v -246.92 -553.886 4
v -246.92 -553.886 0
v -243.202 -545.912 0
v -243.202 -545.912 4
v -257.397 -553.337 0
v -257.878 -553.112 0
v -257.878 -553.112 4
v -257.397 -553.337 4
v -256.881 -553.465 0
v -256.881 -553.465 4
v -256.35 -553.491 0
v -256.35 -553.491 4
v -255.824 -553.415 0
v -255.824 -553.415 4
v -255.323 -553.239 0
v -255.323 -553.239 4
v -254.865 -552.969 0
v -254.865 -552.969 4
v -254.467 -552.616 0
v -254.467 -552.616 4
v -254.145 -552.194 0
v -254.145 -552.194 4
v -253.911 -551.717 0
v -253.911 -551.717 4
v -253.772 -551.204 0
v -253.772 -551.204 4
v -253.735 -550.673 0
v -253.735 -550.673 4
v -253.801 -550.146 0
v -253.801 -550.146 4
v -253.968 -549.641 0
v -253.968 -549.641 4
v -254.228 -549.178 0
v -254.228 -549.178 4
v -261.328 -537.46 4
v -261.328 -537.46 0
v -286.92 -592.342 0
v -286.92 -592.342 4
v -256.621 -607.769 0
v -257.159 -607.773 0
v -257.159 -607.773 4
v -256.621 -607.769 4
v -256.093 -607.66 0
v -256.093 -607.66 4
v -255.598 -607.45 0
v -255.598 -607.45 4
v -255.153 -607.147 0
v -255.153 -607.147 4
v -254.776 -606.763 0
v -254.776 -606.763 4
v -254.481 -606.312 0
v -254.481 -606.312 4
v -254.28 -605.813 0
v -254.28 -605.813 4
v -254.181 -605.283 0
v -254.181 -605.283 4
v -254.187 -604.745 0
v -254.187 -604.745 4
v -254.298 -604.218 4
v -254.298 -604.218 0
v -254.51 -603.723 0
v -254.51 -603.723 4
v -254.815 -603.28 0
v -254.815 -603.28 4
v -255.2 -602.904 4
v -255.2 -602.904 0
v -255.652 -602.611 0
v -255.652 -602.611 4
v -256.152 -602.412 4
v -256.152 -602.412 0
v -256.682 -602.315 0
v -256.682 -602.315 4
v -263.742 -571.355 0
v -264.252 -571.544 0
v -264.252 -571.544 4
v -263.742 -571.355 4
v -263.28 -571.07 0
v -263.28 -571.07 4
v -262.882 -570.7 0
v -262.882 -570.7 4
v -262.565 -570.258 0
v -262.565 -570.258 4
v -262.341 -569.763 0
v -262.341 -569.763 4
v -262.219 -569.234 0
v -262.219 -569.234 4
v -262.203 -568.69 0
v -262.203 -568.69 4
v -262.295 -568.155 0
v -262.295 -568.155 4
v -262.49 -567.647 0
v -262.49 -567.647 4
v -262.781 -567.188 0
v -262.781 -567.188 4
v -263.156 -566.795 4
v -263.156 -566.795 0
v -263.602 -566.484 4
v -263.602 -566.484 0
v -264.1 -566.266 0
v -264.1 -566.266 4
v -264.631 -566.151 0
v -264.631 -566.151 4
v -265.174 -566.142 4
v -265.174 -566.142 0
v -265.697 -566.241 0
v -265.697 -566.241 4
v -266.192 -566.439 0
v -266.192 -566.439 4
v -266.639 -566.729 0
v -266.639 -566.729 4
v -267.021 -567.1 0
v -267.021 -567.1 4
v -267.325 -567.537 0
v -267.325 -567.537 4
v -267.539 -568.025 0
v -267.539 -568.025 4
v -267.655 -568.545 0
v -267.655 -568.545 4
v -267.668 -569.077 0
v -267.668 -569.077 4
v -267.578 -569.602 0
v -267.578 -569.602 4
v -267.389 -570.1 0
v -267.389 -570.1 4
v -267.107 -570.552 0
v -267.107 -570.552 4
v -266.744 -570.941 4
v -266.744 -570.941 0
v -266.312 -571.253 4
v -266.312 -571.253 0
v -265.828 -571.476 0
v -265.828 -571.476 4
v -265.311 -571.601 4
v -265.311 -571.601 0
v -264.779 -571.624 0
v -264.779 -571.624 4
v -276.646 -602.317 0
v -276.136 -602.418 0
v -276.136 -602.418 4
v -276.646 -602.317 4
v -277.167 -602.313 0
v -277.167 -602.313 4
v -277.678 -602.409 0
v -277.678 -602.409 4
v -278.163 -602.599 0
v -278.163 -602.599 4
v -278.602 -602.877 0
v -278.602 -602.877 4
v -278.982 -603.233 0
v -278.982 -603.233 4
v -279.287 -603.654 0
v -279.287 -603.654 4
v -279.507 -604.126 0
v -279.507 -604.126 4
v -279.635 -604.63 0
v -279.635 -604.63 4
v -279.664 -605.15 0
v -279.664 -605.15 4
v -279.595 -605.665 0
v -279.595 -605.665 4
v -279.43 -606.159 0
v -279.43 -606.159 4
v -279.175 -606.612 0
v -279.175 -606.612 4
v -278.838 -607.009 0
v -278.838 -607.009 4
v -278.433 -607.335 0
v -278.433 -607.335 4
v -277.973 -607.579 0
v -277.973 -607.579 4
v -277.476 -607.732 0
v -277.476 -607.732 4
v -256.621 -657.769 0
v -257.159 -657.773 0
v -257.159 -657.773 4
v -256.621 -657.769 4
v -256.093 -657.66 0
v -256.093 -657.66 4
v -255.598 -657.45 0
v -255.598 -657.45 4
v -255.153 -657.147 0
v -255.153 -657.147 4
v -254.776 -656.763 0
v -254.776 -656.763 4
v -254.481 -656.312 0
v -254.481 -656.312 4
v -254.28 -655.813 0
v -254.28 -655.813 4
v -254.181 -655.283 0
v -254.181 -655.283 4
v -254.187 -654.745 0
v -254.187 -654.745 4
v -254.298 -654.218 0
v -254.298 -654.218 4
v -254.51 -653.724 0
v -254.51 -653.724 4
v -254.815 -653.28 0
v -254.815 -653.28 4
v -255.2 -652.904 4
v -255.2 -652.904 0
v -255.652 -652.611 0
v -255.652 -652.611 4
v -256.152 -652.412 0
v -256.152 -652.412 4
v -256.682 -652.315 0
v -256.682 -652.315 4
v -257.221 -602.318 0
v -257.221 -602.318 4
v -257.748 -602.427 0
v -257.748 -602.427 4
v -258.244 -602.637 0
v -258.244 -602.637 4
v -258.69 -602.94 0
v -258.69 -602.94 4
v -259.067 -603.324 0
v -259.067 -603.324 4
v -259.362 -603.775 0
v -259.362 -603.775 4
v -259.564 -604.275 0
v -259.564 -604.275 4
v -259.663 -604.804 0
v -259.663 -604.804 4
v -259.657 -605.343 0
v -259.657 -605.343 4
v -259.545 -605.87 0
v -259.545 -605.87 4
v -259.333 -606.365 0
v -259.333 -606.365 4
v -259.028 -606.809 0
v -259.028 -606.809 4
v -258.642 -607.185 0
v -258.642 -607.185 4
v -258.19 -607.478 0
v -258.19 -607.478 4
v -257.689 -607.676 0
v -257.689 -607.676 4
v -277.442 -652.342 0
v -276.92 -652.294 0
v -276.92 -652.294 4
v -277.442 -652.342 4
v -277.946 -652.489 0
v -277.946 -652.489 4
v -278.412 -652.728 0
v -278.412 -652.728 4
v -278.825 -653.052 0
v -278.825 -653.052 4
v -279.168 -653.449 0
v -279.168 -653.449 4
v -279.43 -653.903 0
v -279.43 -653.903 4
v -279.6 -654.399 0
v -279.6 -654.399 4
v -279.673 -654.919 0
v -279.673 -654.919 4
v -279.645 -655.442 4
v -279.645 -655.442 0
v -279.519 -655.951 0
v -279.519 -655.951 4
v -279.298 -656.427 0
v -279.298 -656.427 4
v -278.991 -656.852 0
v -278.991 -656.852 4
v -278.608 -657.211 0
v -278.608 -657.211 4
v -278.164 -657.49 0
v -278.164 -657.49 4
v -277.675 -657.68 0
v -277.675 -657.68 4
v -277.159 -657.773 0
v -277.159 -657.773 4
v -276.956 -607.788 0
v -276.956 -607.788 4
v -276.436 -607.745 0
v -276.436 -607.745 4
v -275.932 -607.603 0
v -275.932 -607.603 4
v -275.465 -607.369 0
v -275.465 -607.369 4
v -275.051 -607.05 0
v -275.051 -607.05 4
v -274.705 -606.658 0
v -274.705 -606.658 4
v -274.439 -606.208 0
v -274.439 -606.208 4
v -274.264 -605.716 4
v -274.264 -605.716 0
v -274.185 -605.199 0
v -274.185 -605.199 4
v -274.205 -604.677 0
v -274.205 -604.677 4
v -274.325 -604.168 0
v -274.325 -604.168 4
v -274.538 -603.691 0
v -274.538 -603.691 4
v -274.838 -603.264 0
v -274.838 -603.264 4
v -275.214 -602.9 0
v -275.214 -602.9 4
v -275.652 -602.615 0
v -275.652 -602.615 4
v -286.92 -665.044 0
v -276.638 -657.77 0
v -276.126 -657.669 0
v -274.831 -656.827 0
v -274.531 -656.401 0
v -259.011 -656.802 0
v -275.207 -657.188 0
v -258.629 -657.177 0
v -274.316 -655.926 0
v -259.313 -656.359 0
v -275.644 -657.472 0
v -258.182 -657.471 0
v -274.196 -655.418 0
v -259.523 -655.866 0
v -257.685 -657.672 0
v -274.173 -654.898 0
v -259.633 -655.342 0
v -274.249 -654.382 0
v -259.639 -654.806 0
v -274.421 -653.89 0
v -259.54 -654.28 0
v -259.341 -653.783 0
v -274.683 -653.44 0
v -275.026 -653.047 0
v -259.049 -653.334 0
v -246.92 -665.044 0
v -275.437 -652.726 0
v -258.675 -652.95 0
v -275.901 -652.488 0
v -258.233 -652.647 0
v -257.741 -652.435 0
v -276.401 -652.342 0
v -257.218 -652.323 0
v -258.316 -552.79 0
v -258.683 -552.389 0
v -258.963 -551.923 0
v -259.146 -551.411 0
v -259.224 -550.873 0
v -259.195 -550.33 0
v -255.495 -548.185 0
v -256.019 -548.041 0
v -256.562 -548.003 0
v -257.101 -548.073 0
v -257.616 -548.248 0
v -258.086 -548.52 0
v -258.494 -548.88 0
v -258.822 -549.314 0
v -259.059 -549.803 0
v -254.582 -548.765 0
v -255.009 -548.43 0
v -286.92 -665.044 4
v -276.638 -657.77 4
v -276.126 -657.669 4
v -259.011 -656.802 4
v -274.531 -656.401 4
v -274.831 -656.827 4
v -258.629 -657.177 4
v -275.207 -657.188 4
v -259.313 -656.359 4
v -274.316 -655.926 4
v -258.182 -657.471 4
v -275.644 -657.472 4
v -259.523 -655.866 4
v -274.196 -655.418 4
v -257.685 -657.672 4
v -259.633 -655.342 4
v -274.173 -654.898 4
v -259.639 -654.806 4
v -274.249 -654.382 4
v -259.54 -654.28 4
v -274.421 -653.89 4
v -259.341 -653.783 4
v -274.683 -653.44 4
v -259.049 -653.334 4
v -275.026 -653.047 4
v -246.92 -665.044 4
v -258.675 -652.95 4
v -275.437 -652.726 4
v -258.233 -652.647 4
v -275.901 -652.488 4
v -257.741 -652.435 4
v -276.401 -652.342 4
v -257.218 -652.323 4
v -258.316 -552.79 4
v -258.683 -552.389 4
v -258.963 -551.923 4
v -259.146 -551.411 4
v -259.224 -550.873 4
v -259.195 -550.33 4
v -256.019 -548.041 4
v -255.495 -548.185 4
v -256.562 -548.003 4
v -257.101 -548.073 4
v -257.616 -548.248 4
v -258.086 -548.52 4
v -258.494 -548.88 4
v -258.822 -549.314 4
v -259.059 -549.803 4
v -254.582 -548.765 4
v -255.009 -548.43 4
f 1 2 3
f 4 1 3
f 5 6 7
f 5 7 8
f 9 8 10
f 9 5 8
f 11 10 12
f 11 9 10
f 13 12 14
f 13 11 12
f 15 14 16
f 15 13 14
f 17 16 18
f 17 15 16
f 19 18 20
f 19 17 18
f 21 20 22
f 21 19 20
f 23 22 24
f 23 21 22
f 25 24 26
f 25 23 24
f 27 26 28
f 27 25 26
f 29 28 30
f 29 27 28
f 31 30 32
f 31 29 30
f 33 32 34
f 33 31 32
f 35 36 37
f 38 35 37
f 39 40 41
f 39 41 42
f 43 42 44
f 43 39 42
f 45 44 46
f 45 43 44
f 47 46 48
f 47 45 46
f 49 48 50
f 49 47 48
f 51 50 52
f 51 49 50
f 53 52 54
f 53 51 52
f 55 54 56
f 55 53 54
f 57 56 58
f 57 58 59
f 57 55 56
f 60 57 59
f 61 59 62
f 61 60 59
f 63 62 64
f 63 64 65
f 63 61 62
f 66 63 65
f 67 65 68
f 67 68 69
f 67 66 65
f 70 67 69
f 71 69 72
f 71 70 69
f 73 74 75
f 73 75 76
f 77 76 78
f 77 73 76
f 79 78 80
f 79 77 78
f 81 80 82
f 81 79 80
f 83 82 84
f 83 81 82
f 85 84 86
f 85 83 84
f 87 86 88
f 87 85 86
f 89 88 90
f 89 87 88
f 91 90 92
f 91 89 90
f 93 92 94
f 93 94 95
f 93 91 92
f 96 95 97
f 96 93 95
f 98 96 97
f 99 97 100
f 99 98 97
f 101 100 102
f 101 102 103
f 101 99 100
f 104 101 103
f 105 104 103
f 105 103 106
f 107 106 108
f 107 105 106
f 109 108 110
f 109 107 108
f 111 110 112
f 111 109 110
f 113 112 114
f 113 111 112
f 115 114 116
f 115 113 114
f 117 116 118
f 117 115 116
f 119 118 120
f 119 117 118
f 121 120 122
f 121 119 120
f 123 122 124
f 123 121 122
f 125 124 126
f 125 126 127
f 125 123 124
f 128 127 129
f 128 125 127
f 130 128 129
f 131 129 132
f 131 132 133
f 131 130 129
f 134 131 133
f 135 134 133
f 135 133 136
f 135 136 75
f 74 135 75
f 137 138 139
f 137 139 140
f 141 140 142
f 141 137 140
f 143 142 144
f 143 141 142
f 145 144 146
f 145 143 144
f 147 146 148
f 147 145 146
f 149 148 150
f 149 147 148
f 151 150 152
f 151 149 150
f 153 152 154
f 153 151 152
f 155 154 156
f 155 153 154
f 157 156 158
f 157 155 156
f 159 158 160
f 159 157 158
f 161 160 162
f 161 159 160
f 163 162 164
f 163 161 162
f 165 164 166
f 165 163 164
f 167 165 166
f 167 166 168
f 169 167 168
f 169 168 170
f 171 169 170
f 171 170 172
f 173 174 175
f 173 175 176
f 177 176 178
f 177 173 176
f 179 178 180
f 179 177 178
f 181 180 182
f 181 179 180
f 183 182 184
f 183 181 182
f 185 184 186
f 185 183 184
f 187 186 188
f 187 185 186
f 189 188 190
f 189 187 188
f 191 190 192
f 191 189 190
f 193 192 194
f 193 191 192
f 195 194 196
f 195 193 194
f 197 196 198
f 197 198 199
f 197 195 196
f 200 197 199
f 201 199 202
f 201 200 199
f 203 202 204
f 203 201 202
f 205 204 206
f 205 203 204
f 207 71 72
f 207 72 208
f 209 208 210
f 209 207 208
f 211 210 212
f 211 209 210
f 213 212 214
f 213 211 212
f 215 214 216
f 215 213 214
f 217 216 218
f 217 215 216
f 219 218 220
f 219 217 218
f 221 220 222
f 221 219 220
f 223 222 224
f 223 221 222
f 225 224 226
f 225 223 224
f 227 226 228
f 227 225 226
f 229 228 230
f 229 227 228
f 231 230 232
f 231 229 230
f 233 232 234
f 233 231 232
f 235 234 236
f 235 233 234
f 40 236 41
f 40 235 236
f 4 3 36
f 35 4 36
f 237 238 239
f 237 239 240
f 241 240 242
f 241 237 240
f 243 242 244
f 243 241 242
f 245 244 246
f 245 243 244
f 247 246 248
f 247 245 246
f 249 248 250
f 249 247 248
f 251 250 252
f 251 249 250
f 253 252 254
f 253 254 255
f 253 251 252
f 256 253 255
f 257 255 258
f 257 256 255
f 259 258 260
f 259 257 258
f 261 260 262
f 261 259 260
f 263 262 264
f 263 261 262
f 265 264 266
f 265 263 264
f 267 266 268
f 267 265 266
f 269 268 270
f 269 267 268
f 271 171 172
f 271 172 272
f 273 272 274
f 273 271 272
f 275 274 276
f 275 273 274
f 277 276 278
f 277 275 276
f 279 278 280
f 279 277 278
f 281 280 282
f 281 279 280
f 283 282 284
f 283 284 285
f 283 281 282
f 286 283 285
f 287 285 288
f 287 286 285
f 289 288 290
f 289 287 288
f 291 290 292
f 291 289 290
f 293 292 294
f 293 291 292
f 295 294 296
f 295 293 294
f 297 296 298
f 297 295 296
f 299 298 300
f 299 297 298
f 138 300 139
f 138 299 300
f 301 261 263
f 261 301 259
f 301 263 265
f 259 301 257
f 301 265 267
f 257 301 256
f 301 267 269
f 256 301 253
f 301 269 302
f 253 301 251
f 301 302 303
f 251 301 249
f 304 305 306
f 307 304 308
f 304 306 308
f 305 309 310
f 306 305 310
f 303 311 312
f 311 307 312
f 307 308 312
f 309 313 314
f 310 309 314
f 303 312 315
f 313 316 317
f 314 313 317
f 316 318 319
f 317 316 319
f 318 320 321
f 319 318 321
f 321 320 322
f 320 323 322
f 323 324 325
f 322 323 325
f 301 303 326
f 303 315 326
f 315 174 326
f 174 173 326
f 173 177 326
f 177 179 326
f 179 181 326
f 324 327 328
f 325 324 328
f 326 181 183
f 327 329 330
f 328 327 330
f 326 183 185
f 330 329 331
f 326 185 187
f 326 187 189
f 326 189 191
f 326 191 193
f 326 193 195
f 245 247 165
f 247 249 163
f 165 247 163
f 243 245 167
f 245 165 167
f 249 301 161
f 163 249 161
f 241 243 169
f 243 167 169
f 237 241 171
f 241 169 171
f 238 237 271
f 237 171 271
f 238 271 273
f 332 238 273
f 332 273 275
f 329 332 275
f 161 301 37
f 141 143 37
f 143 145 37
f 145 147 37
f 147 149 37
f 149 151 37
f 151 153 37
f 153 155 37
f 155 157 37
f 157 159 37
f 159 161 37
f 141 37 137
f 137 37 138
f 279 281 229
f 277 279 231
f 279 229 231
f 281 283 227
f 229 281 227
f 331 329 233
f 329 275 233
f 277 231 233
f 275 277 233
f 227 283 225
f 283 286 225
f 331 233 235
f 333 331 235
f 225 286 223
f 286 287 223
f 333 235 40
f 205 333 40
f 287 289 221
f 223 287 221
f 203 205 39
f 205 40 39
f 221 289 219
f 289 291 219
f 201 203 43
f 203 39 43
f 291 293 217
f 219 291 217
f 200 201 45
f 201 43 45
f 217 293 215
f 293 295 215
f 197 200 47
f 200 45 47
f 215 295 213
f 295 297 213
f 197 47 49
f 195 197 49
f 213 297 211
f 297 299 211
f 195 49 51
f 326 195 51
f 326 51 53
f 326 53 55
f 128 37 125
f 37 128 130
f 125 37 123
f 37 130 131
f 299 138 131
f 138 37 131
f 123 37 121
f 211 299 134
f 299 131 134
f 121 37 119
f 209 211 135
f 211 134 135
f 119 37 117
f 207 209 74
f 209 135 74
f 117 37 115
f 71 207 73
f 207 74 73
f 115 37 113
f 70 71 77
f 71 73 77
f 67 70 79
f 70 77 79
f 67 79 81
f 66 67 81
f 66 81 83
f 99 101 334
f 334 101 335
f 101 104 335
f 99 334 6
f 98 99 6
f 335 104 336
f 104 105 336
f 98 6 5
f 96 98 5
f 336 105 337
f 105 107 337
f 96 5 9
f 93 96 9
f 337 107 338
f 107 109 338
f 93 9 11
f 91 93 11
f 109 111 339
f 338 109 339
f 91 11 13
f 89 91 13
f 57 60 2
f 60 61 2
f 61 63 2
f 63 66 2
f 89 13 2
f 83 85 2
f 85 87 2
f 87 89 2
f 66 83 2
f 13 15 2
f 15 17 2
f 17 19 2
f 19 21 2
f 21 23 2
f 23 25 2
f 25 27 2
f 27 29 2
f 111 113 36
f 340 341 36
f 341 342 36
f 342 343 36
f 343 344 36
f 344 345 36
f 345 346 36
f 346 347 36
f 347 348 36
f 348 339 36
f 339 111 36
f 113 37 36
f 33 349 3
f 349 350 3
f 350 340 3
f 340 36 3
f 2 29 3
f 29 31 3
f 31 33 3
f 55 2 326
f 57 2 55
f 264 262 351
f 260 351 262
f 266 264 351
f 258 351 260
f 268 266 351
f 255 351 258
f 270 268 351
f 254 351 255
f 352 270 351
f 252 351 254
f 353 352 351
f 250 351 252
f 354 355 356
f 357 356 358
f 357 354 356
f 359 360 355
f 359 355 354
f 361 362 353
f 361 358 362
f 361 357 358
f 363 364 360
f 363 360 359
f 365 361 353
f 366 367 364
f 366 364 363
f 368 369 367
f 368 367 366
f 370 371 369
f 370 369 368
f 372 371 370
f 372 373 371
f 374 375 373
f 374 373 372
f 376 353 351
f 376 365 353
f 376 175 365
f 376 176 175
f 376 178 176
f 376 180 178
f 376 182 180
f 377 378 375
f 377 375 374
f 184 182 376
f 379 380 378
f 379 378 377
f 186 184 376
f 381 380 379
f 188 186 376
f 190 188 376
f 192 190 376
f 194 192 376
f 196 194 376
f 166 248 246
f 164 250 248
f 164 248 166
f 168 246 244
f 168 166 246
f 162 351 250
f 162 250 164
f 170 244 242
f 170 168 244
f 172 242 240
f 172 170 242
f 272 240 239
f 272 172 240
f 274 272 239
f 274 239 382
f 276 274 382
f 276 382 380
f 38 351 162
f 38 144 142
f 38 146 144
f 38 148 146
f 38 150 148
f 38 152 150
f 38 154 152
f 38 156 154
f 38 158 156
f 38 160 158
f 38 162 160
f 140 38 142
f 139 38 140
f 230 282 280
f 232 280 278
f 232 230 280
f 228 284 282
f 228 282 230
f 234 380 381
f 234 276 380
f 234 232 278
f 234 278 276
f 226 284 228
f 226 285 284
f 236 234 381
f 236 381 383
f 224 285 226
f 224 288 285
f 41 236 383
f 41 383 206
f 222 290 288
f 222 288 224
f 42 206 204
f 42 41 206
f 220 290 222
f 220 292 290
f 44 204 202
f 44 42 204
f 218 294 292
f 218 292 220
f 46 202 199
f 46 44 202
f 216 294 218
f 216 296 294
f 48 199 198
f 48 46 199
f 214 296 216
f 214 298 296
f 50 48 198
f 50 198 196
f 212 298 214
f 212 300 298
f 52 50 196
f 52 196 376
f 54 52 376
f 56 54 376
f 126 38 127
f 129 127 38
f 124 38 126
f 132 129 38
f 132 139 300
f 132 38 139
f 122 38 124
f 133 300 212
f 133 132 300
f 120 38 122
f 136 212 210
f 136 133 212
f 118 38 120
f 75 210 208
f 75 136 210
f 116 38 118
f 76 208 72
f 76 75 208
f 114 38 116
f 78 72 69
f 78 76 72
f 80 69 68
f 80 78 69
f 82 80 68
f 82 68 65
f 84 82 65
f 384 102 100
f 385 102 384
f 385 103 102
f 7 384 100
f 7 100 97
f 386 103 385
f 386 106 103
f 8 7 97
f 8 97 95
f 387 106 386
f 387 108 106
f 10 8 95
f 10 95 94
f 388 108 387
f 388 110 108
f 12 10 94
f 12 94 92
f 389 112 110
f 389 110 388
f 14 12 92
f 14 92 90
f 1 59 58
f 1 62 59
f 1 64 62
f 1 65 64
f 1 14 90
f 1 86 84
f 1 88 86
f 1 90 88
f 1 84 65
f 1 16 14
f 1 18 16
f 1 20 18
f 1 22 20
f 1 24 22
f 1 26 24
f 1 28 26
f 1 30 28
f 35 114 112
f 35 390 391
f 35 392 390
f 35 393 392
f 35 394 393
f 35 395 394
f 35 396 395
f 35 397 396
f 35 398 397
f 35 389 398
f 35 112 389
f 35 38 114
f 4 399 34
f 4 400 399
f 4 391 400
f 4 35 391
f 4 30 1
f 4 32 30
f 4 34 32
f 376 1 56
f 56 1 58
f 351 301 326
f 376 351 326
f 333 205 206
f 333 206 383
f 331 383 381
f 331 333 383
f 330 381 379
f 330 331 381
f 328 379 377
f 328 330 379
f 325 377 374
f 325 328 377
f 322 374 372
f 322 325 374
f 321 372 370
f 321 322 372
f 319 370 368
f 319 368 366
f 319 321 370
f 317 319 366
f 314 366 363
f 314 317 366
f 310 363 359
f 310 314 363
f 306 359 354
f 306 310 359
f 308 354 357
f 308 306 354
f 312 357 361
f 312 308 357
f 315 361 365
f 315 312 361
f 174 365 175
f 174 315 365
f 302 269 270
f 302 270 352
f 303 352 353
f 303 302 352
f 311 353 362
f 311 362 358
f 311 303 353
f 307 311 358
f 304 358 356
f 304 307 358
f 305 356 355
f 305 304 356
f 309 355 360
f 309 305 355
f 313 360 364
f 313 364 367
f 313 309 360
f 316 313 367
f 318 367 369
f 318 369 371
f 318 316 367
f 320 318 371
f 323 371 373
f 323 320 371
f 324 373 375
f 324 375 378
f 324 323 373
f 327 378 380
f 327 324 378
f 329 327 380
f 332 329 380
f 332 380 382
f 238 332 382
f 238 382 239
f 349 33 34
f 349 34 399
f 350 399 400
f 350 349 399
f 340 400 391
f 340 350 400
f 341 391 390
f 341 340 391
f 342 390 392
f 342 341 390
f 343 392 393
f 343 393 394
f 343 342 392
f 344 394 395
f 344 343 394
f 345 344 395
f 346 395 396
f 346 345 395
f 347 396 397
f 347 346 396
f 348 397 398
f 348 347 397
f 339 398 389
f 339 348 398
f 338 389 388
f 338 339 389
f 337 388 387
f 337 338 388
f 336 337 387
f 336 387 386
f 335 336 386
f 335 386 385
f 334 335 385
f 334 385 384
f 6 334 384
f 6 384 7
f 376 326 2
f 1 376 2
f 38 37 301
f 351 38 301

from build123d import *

# Parameters (mm, degrees)
BOSS_EXTRUDE1_DEPTH = 4


with BuildPart() as part:
    # Sketch2 → Boss-Extrude1 (new body)
    with BuildSketch(Plane.XY):
        Polygon((-243.202124872, -545.912292309), (-261.32800293, -537.460021973), (-286.920013428, -592.342041016), (-286.920013428, -665.044006348), (-246.92041444, -665.044006348), (-246.92041444, -553.886157392), align=None)
        with BuildLine():
            ThreePointArc((-256.682006836, -652.315040871), (-259.638579462, -654.80647695), (-257.159011841, -657.773010254))
            ThreePointArc((-257.159011841, -657.773010254), (-254.180566252, -655.283485786), (-256.682006836, -652.315040871))
        make_face(mode=Mode.SUBTRACT)
        with BuildLine():
            ThreePointArc((-276.920013428, -652.294006348), (-279.672667512, -654.918648036), (-277.159011841, -657.773010254))
            ThreePointArc((-277.159011841, -657.773010254), (-274.171775379, -655.158601231), (-276.920013428, -652.294006348))
        make_face(mode=Mode.SUBTRACT)
        with BuildLine():
            ThreePointArc((-276.136016846, -602.418029785), (-279.582956118, -604.374783929), (-277.476013184, -607.732025146))
            ThreePointArc((-277.476013184, -607.732025146), (-274.263780083, -605.716086644), (-276.136016846, -602.418029785))
        make_face(mode=Mode.SUBTRACT)
        with BuildLine():
            ThreePointArc((-256.682006836, -602.315002441), (-259.662954971, -604.8043291), (-257.159011841, -607.773010254))
            ThreePointArc((-257.159011841, -607.773010254), (-254.180547037, -605.283466564), (-256.682006836, -602.315002441))
        make_face(mode=Mode.SUBTRACT)
        with BuildLine():
            ThreePointArc((-265.17401123, -566.142028809), (-267.635869624, -569.341884059), (-264.25201416, -571.544006348))
            ThreePointArc((-264.25201416, -571.544006348), (-262.235793714, -568.420211554), (-265.17401123, -566.142028809))
        make_face(mode=Mode.SUBTRACT)
        with BuildLine():
            ThreePointArc((-254.228012085, -549.178039551), (-258.493761484, -548.880446167), (-257.878021241, -553.111999511))
            ThreePointArc((-257.878021241, -553.111999511), (-254.467220991, -552.616353449), (-254.228012085, -549.178039551))
        make_face(mode=Mode.SUBTRACT)
    extrude(amount=BOSS_EXTRUDE1_DEPTH)


solid = part.part
